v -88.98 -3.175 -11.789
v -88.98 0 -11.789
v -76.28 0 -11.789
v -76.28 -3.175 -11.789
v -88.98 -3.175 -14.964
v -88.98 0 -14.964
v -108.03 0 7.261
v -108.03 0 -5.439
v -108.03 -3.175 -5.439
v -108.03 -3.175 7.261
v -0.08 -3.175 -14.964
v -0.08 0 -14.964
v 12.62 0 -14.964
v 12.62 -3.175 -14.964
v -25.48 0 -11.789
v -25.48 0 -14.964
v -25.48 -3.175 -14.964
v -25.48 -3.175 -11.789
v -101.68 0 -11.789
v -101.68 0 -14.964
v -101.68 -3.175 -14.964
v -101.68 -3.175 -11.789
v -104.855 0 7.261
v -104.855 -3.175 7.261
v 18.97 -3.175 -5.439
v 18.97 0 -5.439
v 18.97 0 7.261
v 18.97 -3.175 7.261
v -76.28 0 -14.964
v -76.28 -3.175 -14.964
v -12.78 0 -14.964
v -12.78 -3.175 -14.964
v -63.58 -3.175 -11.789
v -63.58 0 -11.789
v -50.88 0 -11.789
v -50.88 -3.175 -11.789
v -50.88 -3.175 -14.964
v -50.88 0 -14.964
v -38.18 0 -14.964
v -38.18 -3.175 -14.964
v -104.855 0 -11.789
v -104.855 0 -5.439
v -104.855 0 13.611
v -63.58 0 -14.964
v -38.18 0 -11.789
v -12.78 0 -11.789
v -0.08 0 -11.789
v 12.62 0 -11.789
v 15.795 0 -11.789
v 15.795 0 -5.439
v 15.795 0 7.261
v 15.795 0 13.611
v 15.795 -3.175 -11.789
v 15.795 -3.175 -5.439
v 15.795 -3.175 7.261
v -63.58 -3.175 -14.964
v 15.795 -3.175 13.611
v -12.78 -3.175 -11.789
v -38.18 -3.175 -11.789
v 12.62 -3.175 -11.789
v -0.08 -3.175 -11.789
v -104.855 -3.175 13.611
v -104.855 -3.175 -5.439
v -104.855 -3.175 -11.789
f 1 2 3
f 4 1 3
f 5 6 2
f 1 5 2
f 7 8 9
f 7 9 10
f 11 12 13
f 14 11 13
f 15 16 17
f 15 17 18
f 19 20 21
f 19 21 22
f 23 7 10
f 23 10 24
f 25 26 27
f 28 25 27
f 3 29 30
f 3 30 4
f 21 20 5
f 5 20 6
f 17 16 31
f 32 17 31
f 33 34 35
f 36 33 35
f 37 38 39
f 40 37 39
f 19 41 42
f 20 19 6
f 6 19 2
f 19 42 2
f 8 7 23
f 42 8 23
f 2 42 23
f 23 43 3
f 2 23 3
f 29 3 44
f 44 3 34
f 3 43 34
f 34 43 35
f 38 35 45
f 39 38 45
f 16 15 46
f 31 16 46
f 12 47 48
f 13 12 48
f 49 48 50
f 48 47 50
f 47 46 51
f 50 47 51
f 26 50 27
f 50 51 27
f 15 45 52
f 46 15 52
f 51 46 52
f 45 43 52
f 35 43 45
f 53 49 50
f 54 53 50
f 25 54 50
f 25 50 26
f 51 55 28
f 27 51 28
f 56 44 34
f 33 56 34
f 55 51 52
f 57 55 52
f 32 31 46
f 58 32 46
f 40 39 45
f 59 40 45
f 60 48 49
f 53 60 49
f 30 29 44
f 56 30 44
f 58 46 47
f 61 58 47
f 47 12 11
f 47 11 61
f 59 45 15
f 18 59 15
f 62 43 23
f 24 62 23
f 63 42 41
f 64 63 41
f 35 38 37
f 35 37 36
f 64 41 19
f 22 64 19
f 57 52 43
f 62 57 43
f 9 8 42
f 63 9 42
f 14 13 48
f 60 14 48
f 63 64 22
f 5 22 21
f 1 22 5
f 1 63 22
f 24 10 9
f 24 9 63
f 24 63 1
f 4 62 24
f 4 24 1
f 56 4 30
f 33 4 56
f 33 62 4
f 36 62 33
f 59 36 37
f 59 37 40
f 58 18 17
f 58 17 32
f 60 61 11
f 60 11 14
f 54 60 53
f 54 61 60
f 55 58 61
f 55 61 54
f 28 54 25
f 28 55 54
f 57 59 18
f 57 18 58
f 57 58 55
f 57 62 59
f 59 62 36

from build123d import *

# Parameters (mm, degrees)
F0_W     = 12.7
F0_H     = 3.175
F0_W_2   = 3.175
F0_H_2   = 12.7
F1_DEPTH = 3.175


# Not quite as in the source:
# - a feature names something its author has since deleted; it is built from what else it names


with BuildPart() as f1:
    # F0 (on Front) → F1 (new body)
    with BuildSketch(Plane.XZ):
        Polygon((15.7950905681, 13.6112950251), (-104.8549094319, 13.6112950251), (-104.8549094319, 7.2612950251), (-104.8549094319, -5.4387049749), (-104.8549094319, -11.7887049749), (-101.6799094319, -11.7887049749), (-88.9799094319, -11.7887049749), (-76.2799094319, -11.7887049749), (-63.5799094319, -11.7887049749), (-50.8799094319, -11.7887049749), (-38.1799094319, -11.7887049749), (-25.4799094319, -11.7887049749), (-12.7799094319, -11.7887049749), (-0.0799094319, -11.7887049749), (12.6200905681, -11.7887049749), (15.7950905681, -11.7887049749), (15.7950905681, -5.4387049749), (15.7950905681, 7.2612950251), align=None)
        with Locations((-44.5299094319, -13.3762049749)):
            Rectangle(F0_W, F0_H)
        with Locations((-19.1299094319, -13.3762049749)):
            Rectangle(F0_W, F0_H)
        with Locations((-95.3299094319, -13.3762049749)):
            Rectangle(F0_W, F0_H)
        with Locations((-69.9299094319, -13.3762049749)):
            Rectangle(F0_W, F0_H)
        with Locations((6.2700905681, -13.3762049749)):
            Rectangle(F0_W, F0_H)
        with Locations((-106.4424094319, 0.9112950251)):
            Rectangle(F0_W_2, F0_H_2)
        with Locations((17.3825905681, 0.9112950251)):
            Rectangle(F0_W_2, F0_H_2)
    extrude(amount=F1_DEPTH)


solid = f1.part
